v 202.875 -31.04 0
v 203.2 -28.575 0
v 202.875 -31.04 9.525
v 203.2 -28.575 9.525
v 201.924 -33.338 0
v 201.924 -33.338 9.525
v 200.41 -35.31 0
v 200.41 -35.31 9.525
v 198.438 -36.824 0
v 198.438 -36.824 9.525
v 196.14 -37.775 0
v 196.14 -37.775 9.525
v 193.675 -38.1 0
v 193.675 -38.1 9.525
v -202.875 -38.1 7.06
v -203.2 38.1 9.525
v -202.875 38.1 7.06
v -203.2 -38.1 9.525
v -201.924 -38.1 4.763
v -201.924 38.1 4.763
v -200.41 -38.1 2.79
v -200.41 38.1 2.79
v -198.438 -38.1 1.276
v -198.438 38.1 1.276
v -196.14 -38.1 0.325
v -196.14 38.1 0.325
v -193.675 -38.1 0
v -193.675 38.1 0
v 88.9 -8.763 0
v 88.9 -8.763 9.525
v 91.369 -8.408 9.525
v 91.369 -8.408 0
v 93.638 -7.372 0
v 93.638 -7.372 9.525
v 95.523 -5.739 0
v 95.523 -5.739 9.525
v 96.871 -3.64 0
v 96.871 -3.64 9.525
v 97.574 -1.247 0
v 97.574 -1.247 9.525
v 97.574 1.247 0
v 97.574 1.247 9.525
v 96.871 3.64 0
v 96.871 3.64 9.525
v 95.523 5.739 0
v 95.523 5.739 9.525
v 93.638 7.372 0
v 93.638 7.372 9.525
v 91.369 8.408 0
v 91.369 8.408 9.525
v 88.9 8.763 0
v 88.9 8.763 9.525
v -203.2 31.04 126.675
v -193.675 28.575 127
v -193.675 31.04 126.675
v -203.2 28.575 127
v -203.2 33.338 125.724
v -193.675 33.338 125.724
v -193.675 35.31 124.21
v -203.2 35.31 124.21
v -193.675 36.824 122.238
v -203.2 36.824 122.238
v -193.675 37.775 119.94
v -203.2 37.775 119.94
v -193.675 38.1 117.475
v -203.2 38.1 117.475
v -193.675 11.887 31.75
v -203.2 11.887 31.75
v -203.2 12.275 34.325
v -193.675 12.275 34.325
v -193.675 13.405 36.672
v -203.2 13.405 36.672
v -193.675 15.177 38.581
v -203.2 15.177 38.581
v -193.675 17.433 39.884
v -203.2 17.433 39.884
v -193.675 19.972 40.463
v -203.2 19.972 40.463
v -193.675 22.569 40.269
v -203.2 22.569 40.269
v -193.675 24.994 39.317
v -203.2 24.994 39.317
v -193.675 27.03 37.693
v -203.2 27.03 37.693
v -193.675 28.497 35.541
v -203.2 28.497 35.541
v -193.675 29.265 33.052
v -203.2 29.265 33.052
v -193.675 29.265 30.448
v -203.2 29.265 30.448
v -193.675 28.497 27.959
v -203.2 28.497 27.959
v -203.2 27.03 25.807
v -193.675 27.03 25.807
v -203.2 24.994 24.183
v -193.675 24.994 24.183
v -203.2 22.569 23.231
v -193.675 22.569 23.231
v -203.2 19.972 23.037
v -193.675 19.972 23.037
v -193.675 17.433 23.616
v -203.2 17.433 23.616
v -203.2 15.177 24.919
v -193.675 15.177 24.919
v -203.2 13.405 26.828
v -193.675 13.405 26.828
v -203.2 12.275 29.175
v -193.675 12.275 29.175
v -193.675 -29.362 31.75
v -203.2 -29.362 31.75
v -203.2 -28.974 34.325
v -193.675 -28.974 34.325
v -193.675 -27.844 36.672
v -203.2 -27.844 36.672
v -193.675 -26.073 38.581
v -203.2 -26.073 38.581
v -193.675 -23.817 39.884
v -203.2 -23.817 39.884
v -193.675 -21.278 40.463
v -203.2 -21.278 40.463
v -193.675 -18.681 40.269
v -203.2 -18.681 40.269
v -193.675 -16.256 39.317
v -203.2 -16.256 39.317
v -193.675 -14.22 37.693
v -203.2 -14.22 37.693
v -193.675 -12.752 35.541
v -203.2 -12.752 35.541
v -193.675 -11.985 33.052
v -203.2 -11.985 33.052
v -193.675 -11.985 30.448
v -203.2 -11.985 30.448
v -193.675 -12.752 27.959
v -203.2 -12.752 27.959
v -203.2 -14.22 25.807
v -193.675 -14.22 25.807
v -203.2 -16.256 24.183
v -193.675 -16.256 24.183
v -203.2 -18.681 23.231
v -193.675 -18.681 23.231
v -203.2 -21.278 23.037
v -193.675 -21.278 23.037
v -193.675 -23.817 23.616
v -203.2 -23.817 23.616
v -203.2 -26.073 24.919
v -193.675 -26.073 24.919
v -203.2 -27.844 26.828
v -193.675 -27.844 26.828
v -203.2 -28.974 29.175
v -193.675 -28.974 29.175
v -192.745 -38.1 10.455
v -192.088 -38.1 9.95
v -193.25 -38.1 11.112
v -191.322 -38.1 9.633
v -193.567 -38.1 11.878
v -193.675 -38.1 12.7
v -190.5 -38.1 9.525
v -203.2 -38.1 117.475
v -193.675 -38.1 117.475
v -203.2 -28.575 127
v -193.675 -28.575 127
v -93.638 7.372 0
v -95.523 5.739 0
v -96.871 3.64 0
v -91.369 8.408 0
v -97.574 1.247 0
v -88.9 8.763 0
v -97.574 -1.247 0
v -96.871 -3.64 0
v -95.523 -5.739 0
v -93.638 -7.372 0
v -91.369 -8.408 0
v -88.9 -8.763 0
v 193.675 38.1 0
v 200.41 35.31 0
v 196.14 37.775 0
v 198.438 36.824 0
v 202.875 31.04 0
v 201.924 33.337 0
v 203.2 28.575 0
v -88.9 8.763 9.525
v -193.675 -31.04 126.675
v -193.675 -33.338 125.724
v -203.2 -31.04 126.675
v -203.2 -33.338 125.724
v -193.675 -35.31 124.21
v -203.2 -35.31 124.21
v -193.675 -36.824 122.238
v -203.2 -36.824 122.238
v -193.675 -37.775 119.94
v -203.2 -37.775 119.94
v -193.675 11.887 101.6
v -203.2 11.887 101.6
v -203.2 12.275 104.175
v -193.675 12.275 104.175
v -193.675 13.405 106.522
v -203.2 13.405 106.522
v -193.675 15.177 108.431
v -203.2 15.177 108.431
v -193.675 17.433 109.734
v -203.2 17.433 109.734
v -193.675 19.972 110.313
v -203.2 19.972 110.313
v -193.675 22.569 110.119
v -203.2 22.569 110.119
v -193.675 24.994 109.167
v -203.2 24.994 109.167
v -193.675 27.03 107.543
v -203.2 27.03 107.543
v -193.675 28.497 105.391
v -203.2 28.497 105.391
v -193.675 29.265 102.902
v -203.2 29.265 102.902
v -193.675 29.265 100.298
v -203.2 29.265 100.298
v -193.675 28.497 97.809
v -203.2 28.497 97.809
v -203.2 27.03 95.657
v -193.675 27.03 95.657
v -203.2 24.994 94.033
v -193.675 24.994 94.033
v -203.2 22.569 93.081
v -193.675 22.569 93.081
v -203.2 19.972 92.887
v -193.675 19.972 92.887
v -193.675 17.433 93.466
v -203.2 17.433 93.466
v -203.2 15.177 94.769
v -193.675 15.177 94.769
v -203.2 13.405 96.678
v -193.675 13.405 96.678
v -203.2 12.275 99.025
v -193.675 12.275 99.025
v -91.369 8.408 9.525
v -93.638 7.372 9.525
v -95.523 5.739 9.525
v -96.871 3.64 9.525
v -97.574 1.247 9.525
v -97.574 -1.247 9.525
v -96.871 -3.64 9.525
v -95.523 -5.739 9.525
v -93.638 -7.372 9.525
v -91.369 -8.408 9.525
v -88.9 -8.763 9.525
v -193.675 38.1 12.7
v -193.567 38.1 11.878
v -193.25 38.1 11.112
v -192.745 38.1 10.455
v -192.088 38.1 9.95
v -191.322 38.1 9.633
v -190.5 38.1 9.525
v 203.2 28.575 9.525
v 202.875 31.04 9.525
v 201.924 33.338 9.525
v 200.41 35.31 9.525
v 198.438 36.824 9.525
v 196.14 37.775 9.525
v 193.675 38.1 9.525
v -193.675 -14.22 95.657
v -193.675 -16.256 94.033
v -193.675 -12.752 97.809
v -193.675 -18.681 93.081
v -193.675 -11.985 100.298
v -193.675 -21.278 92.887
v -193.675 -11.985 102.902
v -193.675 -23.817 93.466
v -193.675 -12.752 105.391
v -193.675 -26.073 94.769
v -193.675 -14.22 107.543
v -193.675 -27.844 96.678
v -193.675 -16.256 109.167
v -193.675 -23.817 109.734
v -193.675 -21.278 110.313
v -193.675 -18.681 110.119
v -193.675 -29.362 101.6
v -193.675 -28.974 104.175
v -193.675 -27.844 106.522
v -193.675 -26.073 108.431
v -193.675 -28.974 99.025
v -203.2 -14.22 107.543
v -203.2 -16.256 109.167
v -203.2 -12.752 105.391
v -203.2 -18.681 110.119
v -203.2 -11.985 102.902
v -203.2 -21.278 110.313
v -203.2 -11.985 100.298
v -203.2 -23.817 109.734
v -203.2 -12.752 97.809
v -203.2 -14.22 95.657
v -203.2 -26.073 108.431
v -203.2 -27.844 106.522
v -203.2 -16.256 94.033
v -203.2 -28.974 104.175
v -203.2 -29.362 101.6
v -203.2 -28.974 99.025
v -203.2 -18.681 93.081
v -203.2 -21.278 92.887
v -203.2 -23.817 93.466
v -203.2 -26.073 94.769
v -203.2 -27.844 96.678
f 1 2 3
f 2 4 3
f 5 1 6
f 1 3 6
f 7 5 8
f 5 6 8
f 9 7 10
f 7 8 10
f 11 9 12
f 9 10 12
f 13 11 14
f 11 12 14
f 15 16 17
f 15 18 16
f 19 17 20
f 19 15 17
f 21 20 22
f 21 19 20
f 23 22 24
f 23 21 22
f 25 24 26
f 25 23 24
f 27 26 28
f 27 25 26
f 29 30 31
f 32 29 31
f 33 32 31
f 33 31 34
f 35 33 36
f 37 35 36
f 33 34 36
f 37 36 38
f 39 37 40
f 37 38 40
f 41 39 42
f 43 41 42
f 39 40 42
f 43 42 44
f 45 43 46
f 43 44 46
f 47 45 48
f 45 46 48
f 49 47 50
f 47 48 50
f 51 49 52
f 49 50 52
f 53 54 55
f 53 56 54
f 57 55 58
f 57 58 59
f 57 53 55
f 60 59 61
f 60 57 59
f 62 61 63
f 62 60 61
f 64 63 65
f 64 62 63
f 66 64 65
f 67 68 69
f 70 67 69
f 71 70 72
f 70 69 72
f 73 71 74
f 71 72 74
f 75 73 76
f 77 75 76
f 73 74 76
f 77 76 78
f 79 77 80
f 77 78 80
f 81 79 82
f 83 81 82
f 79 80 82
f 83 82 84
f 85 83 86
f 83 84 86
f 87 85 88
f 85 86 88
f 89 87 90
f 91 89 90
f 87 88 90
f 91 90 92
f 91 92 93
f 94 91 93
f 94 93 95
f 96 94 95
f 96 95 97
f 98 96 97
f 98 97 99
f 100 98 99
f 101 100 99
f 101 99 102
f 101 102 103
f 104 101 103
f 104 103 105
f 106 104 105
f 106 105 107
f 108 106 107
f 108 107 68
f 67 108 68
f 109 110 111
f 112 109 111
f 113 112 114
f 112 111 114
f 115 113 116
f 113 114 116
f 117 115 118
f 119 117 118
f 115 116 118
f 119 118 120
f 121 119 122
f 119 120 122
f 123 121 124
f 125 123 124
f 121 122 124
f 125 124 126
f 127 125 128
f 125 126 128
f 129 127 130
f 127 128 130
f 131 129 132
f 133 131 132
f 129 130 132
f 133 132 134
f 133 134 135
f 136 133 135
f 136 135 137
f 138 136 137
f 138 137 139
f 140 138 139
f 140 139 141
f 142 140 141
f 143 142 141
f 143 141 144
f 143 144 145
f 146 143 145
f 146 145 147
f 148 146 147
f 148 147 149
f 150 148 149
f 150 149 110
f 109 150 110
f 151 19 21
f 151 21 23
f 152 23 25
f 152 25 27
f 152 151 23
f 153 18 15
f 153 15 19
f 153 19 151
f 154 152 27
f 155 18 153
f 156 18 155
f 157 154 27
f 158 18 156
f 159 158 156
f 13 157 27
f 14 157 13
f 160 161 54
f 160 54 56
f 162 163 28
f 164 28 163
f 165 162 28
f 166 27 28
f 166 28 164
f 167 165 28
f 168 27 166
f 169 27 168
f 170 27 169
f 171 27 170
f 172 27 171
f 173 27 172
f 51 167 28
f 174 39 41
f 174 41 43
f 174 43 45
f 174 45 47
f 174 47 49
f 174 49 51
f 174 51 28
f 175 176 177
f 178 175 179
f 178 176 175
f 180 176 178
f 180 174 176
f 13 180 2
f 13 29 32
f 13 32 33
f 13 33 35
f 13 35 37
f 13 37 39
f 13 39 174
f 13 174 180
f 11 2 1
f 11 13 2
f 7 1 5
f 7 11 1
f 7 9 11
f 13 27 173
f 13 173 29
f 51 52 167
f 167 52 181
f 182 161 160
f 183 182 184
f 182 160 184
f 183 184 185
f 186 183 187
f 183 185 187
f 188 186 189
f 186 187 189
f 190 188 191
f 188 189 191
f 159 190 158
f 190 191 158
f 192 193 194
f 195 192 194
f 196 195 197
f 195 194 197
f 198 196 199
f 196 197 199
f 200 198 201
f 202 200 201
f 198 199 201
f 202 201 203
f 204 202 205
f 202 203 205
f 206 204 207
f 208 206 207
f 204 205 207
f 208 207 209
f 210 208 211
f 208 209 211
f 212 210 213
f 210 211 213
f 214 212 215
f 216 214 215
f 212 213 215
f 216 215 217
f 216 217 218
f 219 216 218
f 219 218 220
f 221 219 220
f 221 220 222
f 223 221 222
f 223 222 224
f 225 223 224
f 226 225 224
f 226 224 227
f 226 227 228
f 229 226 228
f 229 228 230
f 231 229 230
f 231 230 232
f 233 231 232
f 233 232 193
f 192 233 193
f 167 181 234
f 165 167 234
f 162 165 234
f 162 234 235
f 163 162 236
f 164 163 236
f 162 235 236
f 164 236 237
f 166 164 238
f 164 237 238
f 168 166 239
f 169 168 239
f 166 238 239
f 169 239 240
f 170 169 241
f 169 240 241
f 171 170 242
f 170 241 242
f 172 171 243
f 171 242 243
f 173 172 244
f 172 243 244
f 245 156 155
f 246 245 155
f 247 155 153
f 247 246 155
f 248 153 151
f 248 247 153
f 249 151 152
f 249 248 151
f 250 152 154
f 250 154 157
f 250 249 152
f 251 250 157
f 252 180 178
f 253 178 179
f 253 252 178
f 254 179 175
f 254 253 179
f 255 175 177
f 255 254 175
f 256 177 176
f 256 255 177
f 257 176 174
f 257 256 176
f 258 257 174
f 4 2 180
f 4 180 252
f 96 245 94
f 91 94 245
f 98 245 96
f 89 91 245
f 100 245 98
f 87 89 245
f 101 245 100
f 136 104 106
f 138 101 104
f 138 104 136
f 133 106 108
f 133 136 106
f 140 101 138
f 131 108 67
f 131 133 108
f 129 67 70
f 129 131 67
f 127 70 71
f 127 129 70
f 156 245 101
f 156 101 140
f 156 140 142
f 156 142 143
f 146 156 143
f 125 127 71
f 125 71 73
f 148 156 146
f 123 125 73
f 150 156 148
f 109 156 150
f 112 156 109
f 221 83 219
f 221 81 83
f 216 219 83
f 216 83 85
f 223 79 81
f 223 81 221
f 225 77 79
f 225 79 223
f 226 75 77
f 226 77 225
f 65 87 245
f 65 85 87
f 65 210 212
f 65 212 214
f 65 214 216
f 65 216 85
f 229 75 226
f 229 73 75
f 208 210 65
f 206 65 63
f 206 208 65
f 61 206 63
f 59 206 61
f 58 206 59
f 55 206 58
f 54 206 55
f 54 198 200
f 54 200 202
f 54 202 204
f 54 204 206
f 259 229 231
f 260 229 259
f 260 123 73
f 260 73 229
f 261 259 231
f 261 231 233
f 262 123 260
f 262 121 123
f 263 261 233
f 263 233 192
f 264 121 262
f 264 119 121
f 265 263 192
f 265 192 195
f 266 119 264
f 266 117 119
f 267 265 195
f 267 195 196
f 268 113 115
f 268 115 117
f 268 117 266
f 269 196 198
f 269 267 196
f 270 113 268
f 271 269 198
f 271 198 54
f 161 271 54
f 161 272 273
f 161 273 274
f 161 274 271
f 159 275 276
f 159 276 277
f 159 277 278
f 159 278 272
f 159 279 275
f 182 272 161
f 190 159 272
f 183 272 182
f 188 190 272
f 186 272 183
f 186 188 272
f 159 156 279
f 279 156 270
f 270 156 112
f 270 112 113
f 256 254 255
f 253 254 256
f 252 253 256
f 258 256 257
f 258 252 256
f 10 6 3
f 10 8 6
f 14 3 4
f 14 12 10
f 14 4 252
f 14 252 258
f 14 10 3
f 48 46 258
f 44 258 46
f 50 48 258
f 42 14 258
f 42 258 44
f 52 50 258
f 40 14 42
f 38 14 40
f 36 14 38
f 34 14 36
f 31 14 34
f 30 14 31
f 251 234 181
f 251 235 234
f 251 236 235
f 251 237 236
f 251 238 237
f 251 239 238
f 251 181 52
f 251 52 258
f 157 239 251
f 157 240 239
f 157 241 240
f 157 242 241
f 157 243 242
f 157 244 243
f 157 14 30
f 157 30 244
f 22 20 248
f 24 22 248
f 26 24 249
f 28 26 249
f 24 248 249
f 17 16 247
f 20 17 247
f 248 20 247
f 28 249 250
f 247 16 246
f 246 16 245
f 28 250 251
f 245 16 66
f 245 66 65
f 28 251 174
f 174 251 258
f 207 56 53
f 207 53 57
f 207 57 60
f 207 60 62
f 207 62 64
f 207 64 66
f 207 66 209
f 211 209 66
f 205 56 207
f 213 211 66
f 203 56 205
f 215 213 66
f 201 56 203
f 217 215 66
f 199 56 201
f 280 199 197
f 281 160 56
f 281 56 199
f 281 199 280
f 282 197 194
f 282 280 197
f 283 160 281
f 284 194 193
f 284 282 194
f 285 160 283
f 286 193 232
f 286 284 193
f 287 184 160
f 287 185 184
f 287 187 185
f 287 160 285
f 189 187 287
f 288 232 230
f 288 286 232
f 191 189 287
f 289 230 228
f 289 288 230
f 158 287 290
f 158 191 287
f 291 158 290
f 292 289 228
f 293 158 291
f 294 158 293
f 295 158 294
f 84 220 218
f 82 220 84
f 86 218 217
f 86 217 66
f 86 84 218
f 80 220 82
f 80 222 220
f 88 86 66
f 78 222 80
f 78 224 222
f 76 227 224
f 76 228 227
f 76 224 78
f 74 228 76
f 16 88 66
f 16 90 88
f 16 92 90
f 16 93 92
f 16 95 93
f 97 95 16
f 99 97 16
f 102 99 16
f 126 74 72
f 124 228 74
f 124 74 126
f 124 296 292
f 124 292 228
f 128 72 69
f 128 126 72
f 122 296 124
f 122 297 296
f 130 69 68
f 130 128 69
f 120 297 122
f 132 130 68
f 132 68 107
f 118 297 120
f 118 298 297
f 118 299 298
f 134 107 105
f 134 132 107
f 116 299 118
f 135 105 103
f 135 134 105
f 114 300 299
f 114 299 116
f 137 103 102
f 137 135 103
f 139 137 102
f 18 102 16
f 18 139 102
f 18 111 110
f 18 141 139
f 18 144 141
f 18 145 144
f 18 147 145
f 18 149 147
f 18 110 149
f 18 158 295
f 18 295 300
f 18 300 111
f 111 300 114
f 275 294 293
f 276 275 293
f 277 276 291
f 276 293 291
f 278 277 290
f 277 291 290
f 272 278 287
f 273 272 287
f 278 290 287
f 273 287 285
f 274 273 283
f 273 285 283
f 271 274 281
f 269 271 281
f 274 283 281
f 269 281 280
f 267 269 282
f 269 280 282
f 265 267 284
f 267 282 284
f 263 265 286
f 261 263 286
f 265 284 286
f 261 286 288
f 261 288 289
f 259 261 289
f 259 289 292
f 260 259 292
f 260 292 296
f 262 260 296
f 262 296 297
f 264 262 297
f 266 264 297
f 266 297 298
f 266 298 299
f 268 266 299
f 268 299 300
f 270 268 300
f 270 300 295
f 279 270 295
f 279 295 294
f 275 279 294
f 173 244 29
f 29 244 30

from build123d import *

# Parameters (mm, degrees)
F1_DEPTH = 38.1
F2_R     = 9.525
F3_R     = 3.175
F4_R     = 9.525
F5_R     = 8.7376
F6_DEPTH = 25.4
F8_DEPTH = 25.4


with BuildPart() as f1:
    # F0 (on Front) → F1 (new body, symmetric)
    with BuildSketch(Plane.XZ):
        Polygon((-193.675, 127), (-203.2, 127), (-203.2, 0), (203.2, 0), (203.2, 9.525), (-193.675, 9.525), align=None)
    extrude(amount=F1_DEPTH, both=True)

    # F2
    f2_edges = [f1.edges().sort_by_distance(p)[0] for p in [
        (-198.4375, -38.1, 127),
        (-198.4375, 38.1, 127),
        (203.2, -38.1, 4.7625),
        (203.2, 38.1, 4.7625),
    ]]
    fillet(f2_edges, radius=F2_R)

    # F3
    f3_edges = [f1.edges().sort_by_distance(p)[0] for p in [
        (-193.675, 0, 9.525),
    ]]
    fillet(f3_edges, radius=F3_R)

    # F4
    f4_edges = [f1.edges().sort_by_distance(p)[0] for p in [
        (-203.2, 0, 0),
    ]]
    fillet(f4_edges, radius=F4_R)

    # F5 (on face) → F6 (cut)
    with BuildSketch(Plane(origin=(-203.2, 0, 0), x_dir=(0, -1, 0), z_dir=(-1, 0, 0))):
        with Locations((20.6248, 101.6)):
            Circle(F5_R)
        with Locations((-20.6248, 31.75)):
            Circle(F5_R)
        with Locations((20.6248, 31.75)):
            Circle(F5_R)
        with Locations((-20.6248, 101.6)):
            Circle(F5_R)
    extrude(amount=-F6_DEPTH, mode=Mode.SUBTRACT)

    # F7 (on face) → F8 (cut)
    with BuildSketch(Plane.XY.offset(9.525)):
        with BuildLine():
            ThreePointArc((-88.9, 8.763), (-97.663, 0), (-88.9, -8.763))
            Line((-88.9, -8.763), (88.9, -8.763))
            ThreePointArc((88.9, -8.763), (97.663, 0), (88.9, 8.763))
            Line((88.9, 8.763), (-88.9, 8.763))
        make_face()
    extrude(amount=-F8_DEPTH, mode=Mode.SUBTRACT)


solid = f1.part
